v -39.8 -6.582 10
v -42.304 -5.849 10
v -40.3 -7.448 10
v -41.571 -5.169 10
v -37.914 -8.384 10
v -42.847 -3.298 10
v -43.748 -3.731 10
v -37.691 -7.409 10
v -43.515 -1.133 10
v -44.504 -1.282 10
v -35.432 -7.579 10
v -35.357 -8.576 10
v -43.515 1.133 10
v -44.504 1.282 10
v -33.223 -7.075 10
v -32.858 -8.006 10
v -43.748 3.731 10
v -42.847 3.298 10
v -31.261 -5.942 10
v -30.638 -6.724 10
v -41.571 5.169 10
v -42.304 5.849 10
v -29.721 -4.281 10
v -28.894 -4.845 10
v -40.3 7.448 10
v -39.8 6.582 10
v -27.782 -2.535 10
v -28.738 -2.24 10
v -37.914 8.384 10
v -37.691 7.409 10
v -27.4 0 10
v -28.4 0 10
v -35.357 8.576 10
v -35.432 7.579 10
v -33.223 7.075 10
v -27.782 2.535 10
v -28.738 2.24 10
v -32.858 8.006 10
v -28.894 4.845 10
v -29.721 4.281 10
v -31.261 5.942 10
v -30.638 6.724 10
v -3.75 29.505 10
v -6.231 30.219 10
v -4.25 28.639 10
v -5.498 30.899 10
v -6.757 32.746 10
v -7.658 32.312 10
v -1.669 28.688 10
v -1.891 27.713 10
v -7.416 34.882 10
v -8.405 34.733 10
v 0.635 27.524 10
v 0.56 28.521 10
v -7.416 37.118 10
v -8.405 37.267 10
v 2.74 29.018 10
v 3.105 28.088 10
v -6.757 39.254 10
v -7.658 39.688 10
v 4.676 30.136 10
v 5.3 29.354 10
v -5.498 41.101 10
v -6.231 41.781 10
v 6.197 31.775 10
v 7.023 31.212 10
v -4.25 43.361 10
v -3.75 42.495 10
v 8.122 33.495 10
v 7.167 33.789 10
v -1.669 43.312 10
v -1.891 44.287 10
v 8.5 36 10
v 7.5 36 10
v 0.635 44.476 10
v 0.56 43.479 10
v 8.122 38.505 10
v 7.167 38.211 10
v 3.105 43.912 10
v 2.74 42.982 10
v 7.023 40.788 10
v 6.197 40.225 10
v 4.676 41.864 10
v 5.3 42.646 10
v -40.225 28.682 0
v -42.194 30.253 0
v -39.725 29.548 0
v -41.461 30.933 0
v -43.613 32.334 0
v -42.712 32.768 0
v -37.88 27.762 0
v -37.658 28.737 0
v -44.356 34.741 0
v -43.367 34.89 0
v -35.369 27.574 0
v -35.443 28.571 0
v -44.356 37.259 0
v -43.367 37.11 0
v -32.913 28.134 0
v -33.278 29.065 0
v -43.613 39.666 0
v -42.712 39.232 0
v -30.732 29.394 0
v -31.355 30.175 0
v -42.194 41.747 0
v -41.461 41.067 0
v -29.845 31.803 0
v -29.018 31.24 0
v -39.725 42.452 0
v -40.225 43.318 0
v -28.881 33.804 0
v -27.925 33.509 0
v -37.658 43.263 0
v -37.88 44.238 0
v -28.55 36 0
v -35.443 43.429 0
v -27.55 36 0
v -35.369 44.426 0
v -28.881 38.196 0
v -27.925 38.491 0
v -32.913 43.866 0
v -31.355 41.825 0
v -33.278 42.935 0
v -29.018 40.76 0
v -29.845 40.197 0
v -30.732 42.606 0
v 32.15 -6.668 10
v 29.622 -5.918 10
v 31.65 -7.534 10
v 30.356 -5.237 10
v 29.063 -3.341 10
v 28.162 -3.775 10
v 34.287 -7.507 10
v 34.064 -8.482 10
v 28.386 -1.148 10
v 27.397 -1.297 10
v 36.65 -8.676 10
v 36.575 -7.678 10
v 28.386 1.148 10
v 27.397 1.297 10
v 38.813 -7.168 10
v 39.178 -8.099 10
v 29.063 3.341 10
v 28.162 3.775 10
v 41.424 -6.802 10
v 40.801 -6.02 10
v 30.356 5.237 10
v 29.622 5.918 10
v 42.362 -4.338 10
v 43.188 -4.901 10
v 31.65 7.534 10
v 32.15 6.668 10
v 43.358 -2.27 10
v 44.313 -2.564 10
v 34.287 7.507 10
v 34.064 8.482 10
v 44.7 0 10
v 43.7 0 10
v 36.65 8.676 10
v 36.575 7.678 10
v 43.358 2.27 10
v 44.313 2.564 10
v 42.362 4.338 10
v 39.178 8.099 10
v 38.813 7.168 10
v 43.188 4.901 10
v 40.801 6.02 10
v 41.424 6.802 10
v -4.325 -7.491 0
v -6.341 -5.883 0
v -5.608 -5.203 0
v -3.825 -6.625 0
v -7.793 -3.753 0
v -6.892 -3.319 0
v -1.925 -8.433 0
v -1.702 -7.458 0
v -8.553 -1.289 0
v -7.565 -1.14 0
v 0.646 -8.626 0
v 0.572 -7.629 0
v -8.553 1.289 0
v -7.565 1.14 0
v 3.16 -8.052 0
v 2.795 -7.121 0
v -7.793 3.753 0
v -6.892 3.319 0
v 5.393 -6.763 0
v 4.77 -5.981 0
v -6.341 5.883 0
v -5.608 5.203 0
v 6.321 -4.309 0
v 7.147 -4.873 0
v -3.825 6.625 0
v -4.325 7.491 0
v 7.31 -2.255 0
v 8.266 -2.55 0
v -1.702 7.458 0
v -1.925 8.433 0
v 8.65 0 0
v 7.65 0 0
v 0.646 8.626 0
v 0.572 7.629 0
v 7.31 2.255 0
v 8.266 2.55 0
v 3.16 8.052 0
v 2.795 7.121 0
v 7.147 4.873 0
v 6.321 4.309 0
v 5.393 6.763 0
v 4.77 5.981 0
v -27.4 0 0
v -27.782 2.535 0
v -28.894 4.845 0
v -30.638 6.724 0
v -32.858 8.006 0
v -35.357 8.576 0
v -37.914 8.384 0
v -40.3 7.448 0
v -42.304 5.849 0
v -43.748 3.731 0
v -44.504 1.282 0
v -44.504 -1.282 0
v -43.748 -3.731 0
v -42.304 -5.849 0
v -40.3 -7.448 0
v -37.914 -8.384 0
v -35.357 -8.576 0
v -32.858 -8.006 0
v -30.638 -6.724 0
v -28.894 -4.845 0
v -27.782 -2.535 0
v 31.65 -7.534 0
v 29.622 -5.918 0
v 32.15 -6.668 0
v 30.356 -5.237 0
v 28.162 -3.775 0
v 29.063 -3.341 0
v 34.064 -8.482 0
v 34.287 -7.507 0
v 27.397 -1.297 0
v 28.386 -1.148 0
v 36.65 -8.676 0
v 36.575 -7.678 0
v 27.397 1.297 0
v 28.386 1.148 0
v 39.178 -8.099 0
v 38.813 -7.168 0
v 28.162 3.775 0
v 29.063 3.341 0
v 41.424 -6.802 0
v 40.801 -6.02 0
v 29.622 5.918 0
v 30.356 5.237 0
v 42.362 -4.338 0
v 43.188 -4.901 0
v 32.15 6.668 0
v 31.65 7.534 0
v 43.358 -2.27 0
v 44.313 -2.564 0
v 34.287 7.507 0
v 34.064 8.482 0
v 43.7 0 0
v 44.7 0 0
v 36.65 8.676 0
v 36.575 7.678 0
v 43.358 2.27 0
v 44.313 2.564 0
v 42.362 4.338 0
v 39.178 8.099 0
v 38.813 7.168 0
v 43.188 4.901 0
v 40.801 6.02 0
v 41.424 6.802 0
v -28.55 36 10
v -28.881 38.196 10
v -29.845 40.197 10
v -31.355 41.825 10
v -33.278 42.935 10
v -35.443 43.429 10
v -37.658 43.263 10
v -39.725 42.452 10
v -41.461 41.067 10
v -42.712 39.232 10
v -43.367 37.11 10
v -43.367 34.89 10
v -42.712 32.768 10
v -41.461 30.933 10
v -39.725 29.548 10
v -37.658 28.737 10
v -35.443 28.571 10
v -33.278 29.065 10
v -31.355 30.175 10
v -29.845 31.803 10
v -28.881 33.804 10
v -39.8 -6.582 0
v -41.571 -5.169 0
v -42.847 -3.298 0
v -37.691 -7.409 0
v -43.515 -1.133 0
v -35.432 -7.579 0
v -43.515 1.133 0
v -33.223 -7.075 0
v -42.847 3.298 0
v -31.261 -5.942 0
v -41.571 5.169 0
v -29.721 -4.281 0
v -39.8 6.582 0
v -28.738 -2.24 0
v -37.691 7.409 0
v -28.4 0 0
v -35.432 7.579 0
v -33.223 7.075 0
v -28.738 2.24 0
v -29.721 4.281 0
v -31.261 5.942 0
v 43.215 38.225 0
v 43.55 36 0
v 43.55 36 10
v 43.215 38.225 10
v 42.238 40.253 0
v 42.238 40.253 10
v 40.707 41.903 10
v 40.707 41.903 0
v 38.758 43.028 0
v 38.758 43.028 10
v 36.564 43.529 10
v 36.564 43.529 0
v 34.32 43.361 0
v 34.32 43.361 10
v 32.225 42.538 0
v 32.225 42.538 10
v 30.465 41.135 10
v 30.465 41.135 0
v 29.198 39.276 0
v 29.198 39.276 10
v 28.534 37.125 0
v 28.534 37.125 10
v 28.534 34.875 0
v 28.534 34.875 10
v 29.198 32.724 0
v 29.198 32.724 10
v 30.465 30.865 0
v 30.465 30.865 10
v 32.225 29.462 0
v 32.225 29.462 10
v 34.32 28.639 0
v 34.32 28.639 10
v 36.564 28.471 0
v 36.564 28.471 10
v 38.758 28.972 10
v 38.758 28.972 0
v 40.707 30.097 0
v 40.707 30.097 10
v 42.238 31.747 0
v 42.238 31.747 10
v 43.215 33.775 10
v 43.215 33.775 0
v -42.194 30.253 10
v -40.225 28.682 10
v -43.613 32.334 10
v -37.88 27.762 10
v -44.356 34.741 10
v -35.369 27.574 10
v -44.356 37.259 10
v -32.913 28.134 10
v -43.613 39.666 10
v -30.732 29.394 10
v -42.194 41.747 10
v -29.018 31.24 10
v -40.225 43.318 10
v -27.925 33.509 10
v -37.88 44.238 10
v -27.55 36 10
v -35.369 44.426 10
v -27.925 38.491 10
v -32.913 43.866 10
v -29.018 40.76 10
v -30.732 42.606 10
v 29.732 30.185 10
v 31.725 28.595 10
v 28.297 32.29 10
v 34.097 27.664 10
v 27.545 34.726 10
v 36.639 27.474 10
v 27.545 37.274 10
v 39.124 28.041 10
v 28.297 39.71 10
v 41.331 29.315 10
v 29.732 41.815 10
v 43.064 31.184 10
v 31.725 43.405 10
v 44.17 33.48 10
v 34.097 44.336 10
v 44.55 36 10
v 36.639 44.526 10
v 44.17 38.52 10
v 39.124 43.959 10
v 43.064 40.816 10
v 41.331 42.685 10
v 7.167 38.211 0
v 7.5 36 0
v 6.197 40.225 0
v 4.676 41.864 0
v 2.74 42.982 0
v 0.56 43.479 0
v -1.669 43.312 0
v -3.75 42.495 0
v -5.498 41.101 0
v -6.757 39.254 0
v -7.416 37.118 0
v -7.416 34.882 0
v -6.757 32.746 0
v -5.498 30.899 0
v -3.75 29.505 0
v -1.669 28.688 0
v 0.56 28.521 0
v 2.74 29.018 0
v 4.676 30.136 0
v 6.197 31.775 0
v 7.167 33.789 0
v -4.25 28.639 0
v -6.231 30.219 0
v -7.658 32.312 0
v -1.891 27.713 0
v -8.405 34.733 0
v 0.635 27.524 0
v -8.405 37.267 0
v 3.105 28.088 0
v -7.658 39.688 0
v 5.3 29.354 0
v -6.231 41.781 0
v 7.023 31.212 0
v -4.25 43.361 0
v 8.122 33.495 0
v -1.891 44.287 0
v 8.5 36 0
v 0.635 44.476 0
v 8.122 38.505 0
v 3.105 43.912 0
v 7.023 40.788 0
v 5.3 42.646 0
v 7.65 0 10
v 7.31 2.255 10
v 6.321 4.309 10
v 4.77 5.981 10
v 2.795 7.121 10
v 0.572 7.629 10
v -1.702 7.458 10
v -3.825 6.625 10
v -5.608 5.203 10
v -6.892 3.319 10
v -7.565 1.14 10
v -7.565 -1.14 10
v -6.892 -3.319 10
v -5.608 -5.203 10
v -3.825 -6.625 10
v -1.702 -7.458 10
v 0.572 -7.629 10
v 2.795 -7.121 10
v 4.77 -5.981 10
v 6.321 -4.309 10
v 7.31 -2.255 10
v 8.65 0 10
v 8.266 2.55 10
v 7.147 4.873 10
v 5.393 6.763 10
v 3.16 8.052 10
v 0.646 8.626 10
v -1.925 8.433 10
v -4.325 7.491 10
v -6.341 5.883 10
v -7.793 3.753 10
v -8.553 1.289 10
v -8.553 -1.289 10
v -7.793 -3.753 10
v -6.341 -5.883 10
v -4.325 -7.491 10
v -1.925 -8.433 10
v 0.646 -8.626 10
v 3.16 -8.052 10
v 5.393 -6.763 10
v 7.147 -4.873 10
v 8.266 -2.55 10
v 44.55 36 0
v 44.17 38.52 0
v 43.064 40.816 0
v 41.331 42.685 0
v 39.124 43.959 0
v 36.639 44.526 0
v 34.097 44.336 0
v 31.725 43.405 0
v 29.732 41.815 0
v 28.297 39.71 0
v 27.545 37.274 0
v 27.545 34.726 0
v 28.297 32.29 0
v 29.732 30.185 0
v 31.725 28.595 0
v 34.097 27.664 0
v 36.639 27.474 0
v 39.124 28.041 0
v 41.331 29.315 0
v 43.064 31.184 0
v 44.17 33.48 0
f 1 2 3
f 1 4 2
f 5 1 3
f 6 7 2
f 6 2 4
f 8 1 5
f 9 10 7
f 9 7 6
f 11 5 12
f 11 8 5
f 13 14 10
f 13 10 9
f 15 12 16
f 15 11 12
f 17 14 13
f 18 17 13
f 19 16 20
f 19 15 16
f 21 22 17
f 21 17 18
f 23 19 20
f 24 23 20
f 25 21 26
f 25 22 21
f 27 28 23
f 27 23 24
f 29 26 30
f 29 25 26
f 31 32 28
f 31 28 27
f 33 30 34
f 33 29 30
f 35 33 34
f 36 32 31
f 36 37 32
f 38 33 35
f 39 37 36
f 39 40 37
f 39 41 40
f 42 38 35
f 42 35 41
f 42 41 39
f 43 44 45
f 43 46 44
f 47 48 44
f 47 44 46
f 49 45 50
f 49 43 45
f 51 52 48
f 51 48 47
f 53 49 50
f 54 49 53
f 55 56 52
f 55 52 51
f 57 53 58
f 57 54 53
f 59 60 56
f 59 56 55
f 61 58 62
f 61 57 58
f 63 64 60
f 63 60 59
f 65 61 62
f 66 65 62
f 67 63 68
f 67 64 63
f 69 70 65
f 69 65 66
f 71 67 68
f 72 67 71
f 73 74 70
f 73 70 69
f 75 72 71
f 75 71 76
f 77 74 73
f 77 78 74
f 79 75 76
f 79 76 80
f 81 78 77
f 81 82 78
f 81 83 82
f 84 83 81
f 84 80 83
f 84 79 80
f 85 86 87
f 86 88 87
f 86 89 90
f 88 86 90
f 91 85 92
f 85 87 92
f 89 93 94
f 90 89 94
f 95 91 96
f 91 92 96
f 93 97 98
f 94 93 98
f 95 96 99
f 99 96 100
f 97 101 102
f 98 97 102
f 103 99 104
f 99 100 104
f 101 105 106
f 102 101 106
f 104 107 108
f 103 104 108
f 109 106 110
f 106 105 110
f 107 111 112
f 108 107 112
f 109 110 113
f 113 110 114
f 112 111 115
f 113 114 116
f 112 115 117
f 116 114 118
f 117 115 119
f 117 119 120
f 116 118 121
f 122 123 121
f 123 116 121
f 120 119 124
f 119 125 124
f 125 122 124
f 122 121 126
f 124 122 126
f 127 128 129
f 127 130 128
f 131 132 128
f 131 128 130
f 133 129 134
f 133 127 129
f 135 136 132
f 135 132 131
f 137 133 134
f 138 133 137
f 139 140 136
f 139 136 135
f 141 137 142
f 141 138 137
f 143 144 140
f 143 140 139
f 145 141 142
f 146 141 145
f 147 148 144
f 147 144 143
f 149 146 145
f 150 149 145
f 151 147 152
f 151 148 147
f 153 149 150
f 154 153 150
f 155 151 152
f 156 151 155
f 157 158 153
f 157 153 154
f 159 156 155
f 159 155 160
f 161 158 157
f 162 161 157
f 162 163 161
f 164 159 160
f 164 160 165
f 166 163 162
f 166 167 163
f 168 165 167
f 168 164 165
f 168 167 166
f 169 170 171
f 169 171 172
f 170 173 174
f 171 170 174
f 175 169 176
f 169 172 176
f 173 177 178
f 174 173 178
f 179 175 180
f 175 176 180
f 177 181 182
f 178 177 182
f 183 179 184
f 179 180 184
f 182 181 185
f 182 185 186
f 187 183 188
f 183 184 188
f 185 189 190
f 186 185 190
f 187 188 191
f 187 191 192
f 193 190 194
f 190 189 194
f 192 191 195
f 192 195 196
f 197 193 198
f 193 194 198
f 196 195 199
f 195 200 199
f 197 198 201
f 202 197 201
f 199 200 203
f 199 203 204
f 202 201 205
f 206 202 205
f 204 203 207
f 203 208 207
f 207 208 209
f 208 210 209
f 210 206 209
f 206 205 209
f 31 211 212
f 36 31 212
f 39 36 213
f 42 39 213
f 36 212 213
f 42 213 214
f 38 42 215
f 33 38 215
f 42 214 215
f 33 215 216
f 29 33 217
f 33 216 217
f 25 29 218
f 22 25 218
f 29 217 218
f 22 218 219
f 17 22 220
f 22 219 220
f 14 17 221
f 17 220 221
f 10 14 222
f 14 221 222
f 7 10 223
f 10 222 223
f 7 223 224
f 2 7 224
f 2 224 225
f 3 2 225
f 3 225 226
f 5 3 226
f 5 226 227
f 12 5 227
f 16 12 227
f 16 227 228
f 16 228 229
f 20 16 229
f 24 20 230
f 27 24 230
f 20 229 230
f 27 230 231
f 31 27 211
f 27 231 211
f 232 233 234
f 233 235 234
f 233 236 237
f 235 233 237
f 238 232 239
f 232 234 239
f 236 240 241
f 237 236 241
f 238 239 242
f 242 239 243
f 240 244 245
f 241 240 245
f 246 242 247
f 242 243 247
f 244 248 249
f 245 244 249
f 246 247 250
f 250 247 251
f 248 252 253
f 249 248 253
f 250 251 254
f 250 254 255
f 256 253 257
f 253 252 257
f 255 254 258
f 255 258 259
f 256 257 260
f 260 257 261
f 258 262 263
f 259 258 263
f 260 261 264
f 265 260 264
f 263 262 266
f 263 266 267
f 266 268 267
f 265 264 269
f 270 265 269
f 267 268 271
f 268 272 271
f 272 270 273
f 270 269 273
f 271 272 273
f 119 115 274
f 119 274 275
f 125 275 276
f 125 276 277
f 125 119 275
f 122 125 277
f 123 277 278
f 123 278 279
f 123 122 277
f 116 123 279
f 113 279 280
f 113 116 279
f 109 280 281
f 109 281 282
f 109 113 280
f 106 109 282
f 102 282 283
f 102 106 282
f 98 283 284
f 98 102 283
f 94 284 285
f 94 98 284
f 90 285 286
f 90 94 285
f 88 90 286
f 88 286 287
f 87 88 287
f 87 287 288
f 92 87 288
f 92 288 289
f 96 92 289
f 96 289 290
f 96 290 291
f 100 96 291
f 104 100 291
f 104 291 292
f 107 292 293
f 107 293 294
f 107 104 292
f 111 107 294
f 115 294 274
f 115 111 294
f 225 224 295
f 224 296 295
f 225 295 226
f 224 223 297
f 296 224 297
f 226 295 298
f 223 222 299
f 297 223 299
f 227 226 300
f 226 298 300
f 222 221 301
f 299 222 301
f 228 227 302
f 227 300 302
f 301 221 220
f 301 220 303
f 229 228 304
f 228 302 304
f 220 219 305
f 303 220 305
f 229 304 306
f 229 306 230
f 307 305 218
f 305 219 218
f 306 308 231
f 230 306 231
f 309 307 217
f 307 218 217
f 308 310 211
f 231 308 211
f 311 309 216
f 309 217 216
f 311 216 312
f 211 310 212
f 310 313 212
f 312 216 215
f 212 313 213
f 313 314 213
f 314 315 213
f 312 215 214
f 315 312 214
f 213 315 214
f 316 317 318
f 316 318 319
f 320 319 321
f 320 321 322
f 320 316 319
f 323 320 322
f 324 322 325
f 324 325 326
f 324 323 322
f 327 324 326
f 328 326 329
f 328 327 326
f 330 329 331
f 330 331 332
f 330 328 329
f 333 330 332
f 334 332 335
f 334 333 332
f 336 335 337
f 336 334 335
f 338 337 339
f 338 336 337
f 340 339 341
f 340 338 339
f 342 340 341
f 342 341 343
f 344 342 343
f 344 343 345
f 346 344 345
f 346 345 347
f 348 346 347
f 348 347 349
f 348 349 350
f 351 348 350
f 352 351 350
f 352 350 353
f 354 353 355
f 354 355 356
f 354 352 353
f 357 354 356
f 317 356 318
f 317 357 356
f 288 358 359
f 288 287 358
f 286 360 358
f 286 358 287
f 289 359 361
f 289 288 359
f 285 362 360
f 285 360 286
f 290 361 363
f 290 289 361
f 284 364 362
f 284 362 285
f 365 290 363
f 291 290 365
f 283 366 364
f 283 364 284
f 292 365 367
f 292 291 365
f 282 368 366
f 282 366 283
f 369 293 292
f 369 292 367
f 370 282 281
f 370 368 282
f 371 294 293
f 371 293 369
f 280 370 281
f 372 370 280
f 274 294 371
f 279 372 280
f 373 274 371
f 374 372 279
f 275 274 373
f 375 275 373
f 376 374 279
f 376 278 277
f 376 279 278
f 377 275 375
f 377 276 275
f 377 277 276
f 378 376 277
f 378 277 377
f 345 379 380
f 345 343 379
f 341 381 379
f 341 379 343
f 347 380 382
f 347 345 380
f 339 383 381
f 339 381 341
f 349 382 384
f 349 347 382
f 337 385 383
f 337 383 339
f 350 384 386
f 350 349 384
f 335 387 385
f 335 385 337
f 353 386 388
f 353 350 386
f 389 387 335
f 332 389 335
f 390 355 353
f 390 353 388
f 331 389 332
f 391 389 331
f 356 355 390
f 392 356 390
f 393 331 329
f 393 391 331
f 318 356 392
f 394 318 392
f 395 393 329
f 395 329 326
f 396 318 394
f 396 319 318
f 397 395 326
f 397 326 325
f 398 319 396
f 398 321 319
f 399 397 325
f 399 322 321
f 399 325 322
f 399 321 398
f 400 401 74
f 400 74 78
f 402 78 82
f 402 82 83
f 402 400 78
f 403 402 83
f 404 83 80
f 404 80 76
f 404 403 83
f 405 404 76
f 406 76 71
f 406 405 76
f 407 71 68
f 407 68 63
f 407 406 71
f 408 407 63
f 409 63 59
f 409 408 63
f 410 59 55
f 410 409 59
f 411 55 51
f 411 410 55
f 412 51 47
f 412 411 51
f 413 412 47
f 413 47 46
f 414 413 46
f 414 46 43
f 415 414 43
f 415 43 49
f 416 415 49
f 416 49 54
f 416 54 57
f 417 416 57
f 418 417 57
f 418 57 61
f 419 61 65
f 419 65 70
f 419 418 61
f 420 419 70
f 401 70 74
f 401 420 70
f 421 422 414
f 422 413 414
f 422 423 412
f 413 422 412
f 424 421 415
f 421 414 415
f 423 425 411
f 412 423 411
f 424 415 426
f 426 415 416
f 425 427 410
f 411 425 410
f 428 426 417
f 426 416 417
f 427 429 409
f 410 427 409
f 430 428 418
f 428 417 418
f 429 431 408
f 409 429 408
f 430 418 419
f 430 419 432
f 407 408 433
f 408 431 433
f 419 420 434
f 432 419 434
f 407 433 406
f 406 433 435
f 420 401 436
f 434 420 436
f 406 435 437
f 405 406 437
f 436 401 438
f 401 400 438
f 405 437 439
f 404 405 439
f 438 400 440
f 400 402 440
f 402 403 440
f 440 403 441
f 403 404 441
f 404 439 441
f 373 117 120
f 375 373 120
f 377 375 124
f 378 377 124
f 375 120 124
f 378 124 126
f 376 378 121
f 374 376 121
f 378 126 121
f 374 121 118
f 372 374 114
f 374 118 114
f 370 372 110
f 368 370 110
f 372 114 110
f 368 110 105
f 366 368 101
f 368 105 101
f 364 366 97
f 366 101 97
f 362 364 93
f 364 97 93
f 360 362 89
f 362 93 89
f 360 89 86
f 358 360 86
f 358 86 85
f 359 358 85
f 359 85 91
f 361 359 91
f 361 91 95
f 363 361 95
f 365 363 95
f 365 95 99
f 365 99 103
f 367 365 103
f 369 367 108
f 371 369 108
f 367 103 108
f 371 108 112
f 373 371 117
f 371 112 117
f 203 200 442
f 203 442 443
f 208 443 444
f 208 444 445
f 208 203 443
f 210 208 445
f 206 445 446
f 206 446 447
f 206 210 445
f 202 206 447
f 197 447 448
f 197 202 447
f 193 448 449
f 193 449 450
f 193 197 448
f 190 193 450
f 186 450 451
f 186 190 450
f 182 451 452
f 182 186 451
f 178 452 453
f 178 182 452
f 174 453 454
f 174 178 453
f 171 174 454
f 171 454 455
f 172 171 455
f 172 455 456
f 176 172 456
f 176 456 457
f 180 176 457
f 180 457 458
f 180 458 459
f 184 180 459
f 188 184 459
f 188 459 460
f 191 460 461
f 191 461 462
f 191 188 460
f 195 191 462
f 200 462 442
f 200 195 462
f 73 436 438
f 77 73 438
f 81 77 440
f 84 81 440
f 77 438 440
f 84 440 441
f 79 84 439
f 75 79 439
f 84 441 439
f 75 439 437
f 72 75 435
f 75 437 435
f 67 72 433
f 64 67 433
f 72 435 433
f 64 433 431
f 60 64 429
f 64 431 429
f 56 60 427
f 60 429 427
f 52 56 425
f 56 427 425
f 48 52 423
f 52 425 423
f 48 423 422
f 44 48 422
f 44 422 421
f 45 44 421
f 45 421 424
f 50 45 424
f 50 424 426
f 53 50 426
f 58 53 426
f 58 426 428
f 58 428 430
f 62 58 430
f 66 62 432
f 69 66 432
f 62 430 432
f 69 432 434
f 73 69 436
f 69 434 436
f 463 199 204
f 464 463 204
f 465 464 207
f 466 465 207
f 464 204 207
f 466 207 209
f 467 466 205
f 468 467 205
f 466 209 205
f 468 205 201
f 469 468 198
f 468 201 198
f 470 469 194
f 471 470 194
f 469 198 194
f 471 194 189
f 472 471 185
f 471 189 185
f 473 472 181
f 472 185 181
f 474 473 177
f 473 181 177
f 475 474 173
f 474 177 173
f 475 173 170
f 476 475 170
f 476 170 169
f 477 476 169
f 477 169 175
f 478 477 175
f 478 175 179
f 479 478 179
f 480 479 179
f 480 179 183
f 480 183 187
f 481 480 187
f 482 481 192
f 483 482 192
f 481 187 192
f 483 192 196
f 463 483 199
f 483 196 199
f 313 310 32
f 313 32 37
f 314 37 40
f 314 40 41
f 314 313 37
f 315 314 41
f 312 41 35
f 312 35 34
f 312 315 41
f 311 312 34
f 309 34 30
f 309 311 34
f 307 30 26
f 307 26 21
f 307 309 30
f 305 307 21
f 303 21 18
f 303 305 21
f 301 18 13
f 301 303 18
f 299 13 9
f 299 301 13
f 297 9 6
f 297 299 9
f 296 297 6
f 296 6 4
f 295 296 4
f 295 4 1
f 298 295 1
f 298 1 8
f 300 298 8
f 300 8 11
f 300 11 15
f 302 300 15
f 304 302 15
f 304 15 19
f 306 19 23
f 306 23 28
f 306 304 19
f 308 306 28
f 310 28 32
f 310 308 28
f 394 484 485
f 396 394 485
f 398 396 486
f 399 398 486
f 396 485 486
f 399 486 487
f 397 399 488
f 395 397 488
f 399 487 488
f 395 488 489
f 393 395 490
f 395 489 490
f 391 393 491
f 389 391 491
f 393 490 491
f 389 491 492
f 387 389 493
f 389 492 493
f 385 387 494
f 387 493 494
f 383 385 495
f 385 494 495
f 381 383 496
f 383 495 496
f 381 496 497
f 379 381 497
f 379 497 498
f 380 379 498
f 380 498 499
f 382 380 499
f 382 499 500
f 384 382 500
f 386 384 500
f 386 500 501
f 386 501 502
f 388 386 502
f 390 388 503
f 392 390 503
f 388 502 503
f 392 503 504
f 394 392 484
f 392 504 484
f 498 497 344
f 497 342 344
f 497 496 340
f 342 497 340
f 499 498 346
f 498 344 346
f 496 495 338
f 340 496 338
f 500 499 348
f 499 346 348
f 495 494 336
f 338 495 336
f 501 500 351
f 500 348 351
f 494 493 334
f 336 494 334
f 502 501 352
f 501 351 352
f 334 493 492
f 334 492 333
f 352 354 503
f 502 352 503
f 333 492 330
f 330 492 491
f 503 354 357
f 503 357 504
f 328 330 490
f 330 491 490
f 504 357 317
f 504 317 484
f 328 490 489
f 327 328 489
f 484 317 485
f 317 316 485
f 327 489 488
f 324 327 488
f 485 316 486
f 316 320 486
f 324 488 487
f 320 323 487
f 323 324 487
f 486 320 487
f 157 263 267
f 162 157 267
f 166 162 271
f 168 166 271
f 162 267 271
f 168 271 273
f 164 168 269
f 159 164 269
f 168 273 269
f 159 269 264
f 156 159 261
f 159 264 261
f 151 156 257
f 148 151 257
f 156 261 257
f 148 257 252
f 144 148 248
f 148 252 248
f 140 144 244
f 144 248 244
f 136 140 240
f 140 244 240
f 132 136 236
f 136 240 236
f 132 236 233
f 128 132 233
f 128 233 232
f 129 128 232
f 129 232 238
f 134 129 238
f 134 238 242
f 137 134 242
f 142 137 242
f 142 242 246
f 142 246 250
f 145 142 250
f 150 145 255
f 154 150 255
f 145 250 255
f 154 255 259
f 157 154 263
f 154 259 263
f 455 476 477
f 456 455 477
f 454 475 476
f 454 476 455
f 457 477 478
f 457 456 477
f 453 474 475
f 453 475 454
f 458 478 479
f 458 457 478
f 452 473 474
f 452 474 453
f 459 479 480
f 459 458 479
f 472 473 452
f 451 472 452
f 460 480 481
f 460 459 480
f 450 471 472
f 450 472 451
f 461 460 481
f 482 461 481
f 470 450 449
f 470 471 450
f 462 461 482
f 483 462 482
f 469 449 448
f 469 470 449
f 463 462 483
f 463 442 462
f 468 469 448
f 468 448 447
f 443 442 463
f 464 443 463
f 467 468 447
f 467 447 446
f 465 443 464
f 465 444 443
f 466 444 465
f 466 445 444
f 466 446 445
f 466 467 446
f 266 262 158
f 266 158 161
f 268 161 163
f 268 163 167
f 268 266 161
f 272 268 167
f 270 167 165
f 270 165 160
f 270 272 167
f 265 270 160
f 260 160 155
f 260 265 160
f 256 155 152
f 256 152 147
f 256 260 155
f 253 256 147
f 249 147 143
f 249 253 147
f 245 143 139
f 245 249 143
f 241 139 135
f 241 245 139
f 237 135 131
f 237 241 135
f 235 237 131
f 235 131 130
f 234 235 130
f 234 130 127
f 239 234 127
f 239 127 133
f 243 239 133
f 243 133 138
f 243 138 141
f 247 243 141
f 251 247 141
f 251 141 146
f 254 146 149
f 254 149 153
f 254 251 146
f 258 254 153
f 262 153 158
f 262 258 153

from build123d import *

# Parameters (mm, degrees)
F0_R     = 8.45
F0_R_2   = 7.45
F0_R_3   = 8.5
F0_R_4   = 7.5
F0_R_5   = 8.55
F0_R_6   = 7.55
F0_R_7   = 8.6
F0_R_8   = 7.6
F0_R_9   = 8.65
F0_R_10  = 7.65
F0_R_11  = 8.7
F0_R_12  = 7.7
F1_DEPTH = 10


with BuildPart() as f1:
    # F0 (on Top) → F1 (new body)
    with BuildSketch(Plane.XY):
        with Locations((-36, 36)):
            Circle(F0_R)
        with Locations((-36, 36)):
            Circle(F0_R_2, mode=Mode.SUBTRACT)
        with Locations((0, 36)):
            Circle(F0_R_3)
        with Locations((0, 36)):
            Circle(F0_R_4, mode=Mode.SUBTRACT)
        with Locations((36, 36)):
            Circle(F0_R_5)
        with Locations((36, 36)):
            Circle(F0_R_6, mode=Mode.SUBTRACT)
        with Locations((-36, 0)):
            Circle(F0_R_7)
        with Locations((-36, 0)):
            Circle(F0_R_8, mode=Mode.SUBTRACT)
        Circle(F0_R_9)
        Circle(F0_R_10, mode=Mode.SUBTRACT)
        with Locations((36, 0)):
            Circle(F0_R_11)
        with Locations((36, 0)):
            Circle(F0_R_12, mode=Mode.SUBTRACT)
    extrude(amount=F1_DEPTH)


solid = f1.part
